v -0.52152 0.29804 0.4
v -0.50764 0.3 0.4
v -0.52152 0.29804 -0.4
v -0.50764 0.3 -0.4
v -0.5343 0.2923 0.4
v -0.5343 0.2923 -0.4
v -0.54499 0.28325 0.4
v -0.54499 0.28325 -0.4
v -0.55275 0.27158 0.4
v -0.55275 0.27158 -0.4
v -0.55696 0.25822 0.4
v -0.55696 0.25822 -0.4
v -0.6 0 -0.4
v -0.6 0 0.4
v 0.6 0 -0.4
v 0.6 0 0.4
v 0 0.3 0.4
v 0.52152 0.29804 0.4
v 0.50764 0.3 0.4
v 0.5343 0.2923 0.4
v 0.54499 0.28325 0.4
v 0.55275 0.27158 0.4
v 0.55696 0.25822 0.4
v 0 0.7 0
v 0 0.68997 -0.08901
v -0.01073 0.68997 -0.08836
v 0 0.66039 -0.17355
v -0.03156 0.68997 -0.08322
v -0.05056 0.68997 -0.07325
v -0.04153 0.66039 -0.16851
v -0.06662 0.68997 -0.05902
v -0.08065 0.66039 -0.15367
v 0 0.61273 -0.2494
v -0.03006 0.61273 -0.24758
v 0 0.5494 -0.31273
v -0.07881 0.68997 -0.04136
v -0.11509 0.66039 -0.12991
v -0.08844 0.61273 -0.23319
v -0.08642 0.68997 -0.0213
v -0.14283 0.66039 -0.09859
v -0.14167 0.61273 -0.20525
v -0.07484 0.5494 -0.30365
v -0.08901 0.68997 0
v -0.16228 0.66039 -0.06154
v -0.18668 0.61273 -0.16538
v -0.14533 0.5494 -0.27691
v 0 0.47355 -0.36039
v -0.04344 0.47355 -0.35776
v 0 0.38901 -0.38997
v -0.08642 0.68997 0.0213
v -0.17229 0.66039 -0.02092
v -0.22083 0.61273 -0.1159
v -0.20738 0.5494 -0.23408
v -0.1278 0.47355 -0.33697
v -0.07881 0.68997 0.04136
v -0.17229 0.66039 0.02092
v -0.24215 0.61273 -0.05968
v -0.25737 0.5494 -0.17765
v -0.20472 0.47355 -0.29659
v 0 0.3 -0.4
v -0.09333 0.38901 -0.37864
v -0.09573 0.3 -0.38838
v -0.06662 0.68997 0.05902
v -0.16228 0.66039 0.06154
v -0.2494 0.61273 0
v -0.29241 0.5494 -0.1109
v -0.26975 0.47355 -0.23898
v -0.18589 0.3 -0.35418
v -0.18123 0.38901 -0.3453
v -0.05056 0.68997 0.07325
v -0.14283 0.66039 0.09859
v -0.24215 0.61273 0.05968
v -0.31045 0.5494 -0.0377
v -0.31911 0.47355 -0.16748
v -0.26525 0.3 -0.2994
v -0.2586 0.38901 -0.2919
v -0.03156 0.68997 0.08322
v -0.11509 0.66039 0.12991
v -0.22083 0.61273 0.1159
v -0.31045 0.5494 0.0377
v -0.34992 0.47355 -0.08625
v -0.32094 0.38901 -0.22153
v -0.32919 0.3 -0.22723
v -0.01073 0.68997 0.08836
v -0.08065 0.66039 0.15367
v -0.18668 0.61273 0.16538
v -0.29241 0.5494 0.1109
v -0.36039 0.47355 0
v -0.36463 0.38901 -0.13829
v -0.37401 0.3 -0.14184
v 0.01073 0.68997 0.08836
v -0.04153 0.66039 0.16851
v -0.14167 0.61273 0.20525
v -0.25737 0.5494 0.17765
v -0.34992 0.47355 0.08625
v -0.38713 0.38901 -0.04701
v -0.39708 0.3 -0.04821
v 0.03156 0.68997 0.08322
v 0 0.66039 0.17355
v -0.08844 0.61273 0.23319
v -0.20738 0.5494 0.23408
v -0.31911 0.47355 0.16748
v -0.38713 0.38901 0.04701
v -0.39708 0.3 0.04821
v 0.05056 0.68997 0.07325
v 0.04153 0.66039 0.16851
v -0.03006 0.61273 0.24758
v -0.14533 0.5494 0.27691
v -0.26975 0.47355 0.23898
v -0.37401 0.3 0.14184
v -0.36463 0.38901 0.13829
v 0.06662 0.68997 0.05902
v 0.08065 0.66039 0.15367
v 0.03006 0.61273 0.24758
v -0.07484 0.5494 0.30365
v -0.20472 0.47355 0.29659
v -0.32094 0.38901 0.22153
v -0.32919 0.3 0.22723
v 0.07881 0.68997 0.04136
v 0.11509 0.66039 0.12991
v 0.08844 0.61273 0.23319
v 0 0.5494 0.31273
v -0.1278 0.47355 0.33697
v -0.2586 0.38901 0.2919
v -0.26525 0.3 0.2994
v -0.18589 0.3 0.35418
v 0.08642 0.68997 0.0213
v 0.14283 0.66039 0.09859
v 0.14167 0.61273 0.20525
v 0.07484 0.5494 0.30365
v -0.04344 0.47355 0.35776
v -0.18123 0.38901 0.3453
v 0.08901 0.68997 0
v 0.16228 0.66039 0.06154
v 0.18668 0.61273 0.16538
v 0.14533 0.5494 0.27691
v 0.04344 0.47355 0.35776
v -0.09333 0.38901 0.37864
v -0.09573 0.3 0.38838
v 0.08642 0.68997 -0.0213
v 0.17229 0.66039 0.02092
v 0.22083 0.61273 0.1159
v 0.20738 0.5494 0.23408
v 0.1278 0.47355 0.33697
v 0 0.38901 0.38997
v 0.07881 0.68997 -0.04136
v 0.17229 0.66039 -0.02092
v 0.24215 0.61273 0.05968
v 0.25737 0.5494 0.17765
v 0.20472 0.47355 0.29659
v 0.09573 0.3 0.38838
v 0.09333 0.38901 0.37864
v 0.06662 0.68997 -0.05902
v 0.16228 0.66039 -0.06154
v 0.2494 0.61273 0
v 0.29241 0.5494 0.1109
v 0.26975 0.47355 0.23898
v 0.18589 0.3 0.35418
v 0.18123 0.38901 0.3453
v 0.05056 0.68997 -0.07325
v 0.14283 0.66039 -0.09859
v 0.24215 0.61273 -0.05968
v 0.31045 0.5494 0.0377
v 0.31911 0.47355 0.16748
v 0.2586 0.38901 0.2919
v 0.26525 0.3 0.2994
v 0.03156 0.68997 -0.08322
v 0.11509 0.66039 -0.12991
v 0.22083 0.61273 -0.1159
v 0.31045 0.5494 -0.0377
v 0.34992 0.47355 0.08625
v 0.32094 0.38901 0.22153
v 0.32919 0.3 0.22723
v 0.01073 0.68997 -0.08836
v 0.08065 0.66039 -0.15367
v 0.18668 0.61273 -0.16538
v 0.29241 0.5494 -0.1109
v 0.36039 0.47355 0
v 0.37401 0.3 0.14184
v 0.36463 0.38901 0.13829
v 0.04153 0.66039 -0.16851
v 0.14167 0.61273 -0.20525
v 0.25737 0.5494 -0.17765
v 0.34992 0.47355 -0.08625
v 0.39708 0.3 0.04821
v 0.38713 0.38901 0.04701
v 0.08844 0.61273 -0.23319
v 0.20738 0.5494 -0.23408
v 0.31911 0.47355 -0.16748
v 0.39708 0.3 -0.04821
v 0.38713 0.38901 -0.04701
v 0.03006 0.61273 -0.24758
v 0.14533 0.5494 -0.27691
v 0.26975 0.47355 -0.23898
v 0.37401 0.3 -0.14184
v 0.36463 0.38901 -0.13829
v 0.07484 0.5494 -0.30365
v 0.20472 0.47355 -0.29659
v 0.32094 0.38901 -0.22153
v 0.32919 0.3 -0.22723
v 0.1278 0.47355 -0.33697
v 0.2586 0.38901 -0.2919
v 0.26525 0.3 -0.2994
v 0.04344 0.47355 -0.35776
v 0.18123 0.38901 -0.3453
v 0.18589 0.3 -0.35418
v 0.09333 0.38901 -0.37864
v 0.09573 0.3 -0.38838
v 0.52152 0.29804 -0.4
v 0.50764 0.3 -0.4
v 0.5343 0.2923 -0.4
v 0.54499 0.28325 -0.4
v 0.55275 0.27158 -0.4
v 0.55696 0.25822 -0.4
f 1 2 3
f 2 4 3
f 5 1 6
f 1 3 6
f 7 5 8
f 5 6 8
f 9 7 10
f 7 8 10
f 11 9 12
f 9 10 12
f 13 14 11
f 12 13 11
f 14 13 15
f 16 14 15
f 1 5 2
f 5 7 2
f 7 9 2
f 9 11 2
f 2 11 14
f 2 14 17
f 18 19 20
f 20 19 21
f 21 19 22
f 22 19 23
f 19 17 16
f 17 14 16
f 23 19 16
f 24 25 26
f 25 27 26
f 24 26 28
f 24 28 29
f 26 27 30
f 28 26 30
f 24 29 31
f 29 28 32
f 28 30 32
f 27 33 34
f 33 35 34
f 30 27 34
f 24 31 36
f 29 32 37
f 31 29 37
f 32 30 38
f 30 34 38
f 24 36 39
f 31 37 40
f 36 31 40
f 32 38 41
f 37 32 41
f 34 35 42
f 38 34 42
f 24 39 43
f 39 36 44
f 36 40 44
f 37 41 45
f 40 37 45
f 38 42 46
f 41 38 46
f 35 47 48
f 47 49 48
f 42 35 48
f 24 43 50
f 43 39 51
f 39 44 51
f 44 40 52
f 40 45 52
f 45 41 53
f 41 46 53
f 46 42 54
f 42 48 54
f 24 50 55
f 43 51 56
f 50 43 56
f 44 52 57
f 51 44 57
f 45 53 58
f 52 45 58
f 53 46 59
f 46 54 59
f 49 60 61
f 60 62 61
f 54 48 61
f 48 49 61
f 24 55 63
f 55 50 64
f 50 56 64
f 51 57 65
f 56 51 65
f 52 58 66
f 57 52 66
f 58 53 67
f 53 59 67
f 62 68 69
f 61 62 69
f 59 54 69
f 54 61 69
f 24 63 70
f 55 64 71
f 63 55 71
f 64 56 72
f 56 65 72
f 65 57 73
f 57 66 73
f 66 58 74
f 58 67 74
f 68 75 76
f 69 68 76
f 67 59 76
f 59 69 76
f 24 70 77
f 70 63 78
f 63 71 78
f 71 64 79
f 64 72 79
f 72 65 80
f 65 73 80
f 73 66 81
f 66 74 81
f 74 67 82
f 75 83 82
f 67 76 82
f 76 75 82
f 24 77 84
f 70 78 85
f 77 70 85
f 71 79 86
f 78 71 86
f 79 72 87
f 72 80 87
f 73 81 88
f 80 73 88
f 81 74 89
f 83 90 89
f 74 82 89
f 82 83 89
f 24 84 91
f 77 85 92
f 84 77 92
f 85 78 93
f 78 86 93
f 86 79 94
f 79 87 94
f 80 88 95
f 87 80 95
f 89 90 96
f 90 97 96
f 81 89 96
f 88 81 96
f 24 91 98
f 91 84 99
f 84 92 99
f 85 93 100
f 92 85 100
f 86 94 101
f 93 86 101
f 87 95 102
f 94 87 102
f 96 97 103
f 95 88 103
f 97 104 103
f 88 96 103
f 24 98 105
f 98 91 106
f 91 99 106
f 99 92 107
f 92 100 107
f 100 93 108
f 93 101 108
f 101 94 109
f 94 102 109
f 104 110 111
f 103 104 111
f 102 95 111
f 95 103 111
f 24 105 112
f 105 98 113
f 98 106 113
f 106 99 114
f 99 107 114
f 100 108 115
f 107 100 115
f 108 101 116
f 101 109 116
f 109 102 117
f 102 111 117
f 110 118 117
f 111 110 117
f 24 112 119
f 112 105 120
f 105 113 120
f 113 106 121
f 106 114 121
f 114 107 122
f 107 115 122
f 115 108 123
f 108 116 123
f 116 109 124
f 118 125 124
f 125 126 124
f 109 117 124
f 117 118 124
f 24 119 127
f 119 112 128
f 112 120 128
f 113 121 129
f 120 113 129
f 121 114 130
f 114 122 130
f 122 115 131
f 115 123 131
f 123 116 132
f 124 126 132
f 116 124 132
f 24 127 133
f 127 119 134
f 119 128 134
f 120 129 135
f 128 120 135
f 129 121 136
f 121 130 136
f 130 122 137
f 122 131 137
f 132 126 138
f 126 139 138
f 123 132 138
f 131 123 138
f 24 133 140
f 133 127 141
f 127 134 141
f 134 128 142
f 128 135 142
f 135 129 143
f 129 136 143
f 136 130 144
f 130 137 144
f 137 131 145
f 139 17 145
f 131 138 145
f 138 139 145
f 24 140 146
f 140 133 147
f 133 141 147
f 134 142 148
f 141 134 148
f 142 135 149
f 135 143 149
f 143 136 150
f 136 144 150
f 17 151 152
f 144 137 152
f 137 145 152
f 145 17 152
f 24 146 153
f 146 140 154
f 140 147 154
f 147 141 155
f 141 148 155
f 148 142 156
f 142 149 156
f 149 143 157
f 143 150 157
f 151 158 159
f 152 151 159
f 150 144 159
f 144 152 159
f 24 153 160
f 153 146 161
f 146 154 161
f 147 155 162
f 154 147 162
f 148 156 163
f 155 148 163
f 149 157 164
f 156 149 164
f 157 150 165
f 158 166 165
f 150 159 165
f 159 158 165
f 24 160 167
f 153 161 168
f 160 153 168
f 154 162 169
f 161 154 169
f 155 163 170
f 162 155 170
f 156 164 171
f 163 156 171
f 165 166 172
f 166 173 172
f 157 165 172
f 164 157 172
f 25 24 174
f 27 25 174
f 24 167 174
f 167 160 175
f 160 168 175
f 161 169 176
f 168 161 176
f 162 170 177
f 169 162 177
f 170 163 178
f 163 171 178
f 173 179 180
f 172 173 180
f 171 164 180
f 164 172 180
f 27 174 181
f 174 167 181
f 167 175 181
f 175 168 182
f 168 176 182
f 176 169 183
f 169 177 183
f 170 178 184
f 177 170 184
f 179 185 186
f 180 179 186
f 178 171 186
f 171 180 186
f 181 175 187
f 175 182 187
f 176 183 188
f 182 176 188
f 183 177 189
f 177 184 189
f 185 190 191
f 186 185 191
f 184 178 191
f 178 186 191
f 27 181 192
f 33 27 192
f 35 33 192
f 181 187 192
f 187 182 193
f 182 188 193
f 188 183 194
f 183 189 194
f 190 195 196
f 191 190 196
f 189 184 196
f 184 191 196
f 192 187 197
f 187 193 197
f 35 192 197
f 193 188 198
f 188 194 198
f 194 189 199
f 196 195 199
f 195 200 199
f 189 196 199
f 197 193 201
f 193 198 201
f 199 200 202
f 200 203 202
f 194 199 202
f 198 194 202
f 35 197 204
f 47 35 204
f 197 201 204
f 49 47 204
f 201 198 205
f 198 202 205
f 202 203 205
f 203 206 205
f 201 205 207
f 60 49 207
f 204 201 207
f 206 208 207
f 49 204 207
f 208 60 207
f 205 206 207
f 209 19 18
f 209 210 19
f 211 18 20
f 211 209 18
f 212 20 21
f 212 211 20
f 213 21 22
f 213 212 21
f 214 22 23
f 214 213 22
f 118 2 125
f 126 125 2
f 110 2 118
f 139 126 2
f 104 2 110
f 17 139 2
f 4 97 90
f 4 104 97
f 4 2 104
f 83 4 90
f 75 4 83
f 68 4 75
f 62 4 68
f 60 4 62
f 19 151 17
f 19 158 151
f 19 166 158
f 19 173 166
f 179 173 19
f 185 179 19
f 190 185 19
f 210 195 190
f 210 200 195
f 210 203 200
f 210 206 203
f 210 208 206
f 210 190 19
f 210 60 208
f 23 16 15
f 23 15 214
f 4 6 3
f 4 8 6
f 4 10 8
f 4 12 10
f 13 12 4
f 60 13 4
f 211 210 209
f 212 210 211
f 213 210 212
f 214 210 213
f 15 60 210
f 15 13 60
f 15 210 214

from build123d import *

# Parameters (mm, degrees)
SKETCH1_W           = 1.2
SKETCH1_H           = 0.8
BOSS_EXTRUDE1_DEPTH = 0.3
CUT_EXTRUDE1_DEPTH  = 1.8
FILLET1_R           = 0.05


with BuildPart() as part:
    # Sketch1 → Boss-Extrude1 (new body)
    with BuildSketch(Plane(origin=(0, 0, 0), x_dir=(1, 0, 0), z_dir=(0, 1, 0))):
        Rectangle(SKETCH1_W, SKETCH1_H)
    extrude(amount=BOSS_EXTRUDE1_DEPTH)

    # Sketch5 → Revolve1 (revolve)
    with BuildSketch(Plane(origin=(0, 0, 0), x_dir=(0, 0, -1), z_dir=(1, 0, 0))):
        with BuildLine():
            Line((0, 0), (0, 0.7))
            ThreePointArc((0, 0.7), (0.282842712, 0.582842712), (0.4, 0.3))
            Line((0.4, 0.3), (0.4, 0))
            Line((0.4, 0), (0, 0))
        make_face()
    revolve(axis=Axis((0, 0, 0), (0, 1, 0)))

    # Sketch4 → Cut-Extrude1 (cut, through all)
    with BuildSketch(Plane.XY.offset(0.4)):
        Polygon((-0.6, 0), (-0.55, 0.3), (-0.6, 0.3), align=None)
    cut_extrude1 = extrude(amount=-CUT_EXTRUDE1_DEPTH, mode=Mode.SUBTRACT)

    # Mirror1: Cut-Extrude1 across plane
    add(cut_extrude1.mirror(Plane(origin=(0, 0, 0), x_dir=(0, 0, 1), z_dir=(1, 0, 0))), mode=Mode.SUBTRACT)

    # Fillet1
    fillet1_edges = [part.edges().sort_by_distance(p)[0] for p in [
        (-0.55, 0.3, 0),
        (0.55, 0.3, 0),
    ]]
    fillet(fillet1_edges, radius=FILLET1_R)


solid = part.part
